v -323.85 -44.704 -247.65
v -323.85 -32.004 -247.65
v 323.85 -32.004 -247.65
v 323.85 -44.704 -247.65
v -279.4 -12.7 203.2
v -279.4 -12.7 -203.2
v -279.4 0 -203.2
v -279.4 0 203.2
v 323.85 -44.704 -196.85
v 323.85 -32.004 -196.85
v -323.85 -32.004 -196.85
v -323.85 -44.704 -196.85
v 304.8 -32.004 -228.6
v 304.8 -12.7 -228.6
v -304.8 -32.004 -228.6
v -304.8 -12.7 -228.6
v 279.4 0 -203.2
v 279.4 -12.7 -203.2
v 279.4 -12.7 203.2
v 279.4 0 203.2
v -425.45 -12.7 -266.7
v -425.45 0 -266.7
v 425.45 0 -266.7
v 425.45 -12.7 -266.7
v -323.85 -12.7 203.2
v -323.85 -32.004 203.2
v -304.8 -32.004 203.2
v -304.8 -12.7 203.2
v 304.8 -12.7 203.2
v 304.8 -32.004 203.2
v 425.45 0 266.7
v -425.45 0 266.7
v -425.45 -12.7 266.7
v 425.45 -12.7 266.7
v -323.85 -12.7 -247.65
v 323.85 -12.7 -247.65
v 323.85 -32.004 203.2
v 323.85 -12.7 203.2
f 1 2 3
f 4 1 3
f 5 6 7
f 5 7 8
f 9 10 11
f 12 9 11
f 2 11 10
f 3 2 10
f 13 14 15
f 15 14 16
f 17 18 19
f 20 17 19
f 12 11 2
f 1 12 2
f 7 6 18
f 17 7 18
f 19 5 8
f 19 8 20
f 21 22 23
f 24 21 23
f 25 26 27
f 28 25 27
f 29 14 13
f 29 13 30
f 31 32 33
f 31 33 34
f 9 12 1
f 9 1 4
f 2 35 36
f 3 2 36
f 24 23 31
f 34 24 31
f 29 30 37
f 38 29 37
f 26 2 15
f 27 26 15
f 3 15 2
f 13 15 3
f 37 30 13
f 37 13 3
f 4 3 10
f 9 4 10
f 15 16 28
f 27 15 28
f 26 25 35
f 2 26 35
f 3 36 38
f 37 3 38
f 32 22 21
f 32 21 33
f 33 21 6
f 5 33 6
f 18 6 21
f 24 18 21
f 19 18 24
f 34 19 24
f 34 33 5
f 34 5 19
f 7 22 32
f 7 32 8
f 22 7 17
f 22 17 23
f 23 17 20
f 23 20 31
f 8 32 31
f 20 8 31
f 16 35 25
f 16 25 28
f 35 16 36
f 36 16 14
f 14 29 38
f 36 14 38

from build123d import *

# Parameters (mm, degrees)
F0_W     = 850.9
F0_H     = 533.4
F1_DEPTH = 12.7
F2_W     = 558.8
F2_H     = 406.4
F3_DEPTH = 12.7
F4_W     = 19.05
F4_H     = 431.8
F5_DEPTH = 19.304
F6_W     = 609.6
F6_H     = 31.75
F7_DEPTH = 12.7


with BuildPart() as f1:
    # F0 (on Front) → F1 (new body)
    with BuildSketch(Plane.XZ):
        Rectangle(F0_W, F0_H)
    extrude(amount=F1_DEPTH)

    # F2 (on face) → F3 (cut, through all)
    with BuildSketch(Plane.XZ.offset(12.7)):
        Rectangle(F2_W, F2_H)
    extrude(amount=-F3_DEPTH, mode=Mode.SUBTRACT)


with BuildPart() as f5:
    # F4 (on face) → F5 (new body)
    with BuildSketch(Plane.XZ.offset(12.7)):
        with Locations((-314.325, -12.7)):
            Rectangle(F4_W, F4_H)
        Polygon((-304.8, -228.6), (-323.85, -228.6), (-323.85, -247.65), (323.85, -247.65), (323.85, -228.6), (304.8, -228.6), align=None)
        with Locations((314.325, -12.7)):
            Rectangle(F4_W, F4_H)
    extrude(amount=F5_DEPTH)


with BuildPart() as f7:
    # F6 (on face) → F7 (new body)
    with BuildSketch(Plane.XZ.offset(32.004)):
        with Locations((0, -212.725)):
            Rectangle(F6_W, F6_H)
        Polygon((-323.85, -196.85), (-323.85, -247.65), (323.85, -247.65), (323.85, -196.85), (304.8, -196.85), (304.8, -228.6), (-304.8, -228.6), (-304.8, -196.85), align=None)
    extrude(amount=F7_DEPTH)


solid = Compound([f1.part, f5.part, f7.part])
